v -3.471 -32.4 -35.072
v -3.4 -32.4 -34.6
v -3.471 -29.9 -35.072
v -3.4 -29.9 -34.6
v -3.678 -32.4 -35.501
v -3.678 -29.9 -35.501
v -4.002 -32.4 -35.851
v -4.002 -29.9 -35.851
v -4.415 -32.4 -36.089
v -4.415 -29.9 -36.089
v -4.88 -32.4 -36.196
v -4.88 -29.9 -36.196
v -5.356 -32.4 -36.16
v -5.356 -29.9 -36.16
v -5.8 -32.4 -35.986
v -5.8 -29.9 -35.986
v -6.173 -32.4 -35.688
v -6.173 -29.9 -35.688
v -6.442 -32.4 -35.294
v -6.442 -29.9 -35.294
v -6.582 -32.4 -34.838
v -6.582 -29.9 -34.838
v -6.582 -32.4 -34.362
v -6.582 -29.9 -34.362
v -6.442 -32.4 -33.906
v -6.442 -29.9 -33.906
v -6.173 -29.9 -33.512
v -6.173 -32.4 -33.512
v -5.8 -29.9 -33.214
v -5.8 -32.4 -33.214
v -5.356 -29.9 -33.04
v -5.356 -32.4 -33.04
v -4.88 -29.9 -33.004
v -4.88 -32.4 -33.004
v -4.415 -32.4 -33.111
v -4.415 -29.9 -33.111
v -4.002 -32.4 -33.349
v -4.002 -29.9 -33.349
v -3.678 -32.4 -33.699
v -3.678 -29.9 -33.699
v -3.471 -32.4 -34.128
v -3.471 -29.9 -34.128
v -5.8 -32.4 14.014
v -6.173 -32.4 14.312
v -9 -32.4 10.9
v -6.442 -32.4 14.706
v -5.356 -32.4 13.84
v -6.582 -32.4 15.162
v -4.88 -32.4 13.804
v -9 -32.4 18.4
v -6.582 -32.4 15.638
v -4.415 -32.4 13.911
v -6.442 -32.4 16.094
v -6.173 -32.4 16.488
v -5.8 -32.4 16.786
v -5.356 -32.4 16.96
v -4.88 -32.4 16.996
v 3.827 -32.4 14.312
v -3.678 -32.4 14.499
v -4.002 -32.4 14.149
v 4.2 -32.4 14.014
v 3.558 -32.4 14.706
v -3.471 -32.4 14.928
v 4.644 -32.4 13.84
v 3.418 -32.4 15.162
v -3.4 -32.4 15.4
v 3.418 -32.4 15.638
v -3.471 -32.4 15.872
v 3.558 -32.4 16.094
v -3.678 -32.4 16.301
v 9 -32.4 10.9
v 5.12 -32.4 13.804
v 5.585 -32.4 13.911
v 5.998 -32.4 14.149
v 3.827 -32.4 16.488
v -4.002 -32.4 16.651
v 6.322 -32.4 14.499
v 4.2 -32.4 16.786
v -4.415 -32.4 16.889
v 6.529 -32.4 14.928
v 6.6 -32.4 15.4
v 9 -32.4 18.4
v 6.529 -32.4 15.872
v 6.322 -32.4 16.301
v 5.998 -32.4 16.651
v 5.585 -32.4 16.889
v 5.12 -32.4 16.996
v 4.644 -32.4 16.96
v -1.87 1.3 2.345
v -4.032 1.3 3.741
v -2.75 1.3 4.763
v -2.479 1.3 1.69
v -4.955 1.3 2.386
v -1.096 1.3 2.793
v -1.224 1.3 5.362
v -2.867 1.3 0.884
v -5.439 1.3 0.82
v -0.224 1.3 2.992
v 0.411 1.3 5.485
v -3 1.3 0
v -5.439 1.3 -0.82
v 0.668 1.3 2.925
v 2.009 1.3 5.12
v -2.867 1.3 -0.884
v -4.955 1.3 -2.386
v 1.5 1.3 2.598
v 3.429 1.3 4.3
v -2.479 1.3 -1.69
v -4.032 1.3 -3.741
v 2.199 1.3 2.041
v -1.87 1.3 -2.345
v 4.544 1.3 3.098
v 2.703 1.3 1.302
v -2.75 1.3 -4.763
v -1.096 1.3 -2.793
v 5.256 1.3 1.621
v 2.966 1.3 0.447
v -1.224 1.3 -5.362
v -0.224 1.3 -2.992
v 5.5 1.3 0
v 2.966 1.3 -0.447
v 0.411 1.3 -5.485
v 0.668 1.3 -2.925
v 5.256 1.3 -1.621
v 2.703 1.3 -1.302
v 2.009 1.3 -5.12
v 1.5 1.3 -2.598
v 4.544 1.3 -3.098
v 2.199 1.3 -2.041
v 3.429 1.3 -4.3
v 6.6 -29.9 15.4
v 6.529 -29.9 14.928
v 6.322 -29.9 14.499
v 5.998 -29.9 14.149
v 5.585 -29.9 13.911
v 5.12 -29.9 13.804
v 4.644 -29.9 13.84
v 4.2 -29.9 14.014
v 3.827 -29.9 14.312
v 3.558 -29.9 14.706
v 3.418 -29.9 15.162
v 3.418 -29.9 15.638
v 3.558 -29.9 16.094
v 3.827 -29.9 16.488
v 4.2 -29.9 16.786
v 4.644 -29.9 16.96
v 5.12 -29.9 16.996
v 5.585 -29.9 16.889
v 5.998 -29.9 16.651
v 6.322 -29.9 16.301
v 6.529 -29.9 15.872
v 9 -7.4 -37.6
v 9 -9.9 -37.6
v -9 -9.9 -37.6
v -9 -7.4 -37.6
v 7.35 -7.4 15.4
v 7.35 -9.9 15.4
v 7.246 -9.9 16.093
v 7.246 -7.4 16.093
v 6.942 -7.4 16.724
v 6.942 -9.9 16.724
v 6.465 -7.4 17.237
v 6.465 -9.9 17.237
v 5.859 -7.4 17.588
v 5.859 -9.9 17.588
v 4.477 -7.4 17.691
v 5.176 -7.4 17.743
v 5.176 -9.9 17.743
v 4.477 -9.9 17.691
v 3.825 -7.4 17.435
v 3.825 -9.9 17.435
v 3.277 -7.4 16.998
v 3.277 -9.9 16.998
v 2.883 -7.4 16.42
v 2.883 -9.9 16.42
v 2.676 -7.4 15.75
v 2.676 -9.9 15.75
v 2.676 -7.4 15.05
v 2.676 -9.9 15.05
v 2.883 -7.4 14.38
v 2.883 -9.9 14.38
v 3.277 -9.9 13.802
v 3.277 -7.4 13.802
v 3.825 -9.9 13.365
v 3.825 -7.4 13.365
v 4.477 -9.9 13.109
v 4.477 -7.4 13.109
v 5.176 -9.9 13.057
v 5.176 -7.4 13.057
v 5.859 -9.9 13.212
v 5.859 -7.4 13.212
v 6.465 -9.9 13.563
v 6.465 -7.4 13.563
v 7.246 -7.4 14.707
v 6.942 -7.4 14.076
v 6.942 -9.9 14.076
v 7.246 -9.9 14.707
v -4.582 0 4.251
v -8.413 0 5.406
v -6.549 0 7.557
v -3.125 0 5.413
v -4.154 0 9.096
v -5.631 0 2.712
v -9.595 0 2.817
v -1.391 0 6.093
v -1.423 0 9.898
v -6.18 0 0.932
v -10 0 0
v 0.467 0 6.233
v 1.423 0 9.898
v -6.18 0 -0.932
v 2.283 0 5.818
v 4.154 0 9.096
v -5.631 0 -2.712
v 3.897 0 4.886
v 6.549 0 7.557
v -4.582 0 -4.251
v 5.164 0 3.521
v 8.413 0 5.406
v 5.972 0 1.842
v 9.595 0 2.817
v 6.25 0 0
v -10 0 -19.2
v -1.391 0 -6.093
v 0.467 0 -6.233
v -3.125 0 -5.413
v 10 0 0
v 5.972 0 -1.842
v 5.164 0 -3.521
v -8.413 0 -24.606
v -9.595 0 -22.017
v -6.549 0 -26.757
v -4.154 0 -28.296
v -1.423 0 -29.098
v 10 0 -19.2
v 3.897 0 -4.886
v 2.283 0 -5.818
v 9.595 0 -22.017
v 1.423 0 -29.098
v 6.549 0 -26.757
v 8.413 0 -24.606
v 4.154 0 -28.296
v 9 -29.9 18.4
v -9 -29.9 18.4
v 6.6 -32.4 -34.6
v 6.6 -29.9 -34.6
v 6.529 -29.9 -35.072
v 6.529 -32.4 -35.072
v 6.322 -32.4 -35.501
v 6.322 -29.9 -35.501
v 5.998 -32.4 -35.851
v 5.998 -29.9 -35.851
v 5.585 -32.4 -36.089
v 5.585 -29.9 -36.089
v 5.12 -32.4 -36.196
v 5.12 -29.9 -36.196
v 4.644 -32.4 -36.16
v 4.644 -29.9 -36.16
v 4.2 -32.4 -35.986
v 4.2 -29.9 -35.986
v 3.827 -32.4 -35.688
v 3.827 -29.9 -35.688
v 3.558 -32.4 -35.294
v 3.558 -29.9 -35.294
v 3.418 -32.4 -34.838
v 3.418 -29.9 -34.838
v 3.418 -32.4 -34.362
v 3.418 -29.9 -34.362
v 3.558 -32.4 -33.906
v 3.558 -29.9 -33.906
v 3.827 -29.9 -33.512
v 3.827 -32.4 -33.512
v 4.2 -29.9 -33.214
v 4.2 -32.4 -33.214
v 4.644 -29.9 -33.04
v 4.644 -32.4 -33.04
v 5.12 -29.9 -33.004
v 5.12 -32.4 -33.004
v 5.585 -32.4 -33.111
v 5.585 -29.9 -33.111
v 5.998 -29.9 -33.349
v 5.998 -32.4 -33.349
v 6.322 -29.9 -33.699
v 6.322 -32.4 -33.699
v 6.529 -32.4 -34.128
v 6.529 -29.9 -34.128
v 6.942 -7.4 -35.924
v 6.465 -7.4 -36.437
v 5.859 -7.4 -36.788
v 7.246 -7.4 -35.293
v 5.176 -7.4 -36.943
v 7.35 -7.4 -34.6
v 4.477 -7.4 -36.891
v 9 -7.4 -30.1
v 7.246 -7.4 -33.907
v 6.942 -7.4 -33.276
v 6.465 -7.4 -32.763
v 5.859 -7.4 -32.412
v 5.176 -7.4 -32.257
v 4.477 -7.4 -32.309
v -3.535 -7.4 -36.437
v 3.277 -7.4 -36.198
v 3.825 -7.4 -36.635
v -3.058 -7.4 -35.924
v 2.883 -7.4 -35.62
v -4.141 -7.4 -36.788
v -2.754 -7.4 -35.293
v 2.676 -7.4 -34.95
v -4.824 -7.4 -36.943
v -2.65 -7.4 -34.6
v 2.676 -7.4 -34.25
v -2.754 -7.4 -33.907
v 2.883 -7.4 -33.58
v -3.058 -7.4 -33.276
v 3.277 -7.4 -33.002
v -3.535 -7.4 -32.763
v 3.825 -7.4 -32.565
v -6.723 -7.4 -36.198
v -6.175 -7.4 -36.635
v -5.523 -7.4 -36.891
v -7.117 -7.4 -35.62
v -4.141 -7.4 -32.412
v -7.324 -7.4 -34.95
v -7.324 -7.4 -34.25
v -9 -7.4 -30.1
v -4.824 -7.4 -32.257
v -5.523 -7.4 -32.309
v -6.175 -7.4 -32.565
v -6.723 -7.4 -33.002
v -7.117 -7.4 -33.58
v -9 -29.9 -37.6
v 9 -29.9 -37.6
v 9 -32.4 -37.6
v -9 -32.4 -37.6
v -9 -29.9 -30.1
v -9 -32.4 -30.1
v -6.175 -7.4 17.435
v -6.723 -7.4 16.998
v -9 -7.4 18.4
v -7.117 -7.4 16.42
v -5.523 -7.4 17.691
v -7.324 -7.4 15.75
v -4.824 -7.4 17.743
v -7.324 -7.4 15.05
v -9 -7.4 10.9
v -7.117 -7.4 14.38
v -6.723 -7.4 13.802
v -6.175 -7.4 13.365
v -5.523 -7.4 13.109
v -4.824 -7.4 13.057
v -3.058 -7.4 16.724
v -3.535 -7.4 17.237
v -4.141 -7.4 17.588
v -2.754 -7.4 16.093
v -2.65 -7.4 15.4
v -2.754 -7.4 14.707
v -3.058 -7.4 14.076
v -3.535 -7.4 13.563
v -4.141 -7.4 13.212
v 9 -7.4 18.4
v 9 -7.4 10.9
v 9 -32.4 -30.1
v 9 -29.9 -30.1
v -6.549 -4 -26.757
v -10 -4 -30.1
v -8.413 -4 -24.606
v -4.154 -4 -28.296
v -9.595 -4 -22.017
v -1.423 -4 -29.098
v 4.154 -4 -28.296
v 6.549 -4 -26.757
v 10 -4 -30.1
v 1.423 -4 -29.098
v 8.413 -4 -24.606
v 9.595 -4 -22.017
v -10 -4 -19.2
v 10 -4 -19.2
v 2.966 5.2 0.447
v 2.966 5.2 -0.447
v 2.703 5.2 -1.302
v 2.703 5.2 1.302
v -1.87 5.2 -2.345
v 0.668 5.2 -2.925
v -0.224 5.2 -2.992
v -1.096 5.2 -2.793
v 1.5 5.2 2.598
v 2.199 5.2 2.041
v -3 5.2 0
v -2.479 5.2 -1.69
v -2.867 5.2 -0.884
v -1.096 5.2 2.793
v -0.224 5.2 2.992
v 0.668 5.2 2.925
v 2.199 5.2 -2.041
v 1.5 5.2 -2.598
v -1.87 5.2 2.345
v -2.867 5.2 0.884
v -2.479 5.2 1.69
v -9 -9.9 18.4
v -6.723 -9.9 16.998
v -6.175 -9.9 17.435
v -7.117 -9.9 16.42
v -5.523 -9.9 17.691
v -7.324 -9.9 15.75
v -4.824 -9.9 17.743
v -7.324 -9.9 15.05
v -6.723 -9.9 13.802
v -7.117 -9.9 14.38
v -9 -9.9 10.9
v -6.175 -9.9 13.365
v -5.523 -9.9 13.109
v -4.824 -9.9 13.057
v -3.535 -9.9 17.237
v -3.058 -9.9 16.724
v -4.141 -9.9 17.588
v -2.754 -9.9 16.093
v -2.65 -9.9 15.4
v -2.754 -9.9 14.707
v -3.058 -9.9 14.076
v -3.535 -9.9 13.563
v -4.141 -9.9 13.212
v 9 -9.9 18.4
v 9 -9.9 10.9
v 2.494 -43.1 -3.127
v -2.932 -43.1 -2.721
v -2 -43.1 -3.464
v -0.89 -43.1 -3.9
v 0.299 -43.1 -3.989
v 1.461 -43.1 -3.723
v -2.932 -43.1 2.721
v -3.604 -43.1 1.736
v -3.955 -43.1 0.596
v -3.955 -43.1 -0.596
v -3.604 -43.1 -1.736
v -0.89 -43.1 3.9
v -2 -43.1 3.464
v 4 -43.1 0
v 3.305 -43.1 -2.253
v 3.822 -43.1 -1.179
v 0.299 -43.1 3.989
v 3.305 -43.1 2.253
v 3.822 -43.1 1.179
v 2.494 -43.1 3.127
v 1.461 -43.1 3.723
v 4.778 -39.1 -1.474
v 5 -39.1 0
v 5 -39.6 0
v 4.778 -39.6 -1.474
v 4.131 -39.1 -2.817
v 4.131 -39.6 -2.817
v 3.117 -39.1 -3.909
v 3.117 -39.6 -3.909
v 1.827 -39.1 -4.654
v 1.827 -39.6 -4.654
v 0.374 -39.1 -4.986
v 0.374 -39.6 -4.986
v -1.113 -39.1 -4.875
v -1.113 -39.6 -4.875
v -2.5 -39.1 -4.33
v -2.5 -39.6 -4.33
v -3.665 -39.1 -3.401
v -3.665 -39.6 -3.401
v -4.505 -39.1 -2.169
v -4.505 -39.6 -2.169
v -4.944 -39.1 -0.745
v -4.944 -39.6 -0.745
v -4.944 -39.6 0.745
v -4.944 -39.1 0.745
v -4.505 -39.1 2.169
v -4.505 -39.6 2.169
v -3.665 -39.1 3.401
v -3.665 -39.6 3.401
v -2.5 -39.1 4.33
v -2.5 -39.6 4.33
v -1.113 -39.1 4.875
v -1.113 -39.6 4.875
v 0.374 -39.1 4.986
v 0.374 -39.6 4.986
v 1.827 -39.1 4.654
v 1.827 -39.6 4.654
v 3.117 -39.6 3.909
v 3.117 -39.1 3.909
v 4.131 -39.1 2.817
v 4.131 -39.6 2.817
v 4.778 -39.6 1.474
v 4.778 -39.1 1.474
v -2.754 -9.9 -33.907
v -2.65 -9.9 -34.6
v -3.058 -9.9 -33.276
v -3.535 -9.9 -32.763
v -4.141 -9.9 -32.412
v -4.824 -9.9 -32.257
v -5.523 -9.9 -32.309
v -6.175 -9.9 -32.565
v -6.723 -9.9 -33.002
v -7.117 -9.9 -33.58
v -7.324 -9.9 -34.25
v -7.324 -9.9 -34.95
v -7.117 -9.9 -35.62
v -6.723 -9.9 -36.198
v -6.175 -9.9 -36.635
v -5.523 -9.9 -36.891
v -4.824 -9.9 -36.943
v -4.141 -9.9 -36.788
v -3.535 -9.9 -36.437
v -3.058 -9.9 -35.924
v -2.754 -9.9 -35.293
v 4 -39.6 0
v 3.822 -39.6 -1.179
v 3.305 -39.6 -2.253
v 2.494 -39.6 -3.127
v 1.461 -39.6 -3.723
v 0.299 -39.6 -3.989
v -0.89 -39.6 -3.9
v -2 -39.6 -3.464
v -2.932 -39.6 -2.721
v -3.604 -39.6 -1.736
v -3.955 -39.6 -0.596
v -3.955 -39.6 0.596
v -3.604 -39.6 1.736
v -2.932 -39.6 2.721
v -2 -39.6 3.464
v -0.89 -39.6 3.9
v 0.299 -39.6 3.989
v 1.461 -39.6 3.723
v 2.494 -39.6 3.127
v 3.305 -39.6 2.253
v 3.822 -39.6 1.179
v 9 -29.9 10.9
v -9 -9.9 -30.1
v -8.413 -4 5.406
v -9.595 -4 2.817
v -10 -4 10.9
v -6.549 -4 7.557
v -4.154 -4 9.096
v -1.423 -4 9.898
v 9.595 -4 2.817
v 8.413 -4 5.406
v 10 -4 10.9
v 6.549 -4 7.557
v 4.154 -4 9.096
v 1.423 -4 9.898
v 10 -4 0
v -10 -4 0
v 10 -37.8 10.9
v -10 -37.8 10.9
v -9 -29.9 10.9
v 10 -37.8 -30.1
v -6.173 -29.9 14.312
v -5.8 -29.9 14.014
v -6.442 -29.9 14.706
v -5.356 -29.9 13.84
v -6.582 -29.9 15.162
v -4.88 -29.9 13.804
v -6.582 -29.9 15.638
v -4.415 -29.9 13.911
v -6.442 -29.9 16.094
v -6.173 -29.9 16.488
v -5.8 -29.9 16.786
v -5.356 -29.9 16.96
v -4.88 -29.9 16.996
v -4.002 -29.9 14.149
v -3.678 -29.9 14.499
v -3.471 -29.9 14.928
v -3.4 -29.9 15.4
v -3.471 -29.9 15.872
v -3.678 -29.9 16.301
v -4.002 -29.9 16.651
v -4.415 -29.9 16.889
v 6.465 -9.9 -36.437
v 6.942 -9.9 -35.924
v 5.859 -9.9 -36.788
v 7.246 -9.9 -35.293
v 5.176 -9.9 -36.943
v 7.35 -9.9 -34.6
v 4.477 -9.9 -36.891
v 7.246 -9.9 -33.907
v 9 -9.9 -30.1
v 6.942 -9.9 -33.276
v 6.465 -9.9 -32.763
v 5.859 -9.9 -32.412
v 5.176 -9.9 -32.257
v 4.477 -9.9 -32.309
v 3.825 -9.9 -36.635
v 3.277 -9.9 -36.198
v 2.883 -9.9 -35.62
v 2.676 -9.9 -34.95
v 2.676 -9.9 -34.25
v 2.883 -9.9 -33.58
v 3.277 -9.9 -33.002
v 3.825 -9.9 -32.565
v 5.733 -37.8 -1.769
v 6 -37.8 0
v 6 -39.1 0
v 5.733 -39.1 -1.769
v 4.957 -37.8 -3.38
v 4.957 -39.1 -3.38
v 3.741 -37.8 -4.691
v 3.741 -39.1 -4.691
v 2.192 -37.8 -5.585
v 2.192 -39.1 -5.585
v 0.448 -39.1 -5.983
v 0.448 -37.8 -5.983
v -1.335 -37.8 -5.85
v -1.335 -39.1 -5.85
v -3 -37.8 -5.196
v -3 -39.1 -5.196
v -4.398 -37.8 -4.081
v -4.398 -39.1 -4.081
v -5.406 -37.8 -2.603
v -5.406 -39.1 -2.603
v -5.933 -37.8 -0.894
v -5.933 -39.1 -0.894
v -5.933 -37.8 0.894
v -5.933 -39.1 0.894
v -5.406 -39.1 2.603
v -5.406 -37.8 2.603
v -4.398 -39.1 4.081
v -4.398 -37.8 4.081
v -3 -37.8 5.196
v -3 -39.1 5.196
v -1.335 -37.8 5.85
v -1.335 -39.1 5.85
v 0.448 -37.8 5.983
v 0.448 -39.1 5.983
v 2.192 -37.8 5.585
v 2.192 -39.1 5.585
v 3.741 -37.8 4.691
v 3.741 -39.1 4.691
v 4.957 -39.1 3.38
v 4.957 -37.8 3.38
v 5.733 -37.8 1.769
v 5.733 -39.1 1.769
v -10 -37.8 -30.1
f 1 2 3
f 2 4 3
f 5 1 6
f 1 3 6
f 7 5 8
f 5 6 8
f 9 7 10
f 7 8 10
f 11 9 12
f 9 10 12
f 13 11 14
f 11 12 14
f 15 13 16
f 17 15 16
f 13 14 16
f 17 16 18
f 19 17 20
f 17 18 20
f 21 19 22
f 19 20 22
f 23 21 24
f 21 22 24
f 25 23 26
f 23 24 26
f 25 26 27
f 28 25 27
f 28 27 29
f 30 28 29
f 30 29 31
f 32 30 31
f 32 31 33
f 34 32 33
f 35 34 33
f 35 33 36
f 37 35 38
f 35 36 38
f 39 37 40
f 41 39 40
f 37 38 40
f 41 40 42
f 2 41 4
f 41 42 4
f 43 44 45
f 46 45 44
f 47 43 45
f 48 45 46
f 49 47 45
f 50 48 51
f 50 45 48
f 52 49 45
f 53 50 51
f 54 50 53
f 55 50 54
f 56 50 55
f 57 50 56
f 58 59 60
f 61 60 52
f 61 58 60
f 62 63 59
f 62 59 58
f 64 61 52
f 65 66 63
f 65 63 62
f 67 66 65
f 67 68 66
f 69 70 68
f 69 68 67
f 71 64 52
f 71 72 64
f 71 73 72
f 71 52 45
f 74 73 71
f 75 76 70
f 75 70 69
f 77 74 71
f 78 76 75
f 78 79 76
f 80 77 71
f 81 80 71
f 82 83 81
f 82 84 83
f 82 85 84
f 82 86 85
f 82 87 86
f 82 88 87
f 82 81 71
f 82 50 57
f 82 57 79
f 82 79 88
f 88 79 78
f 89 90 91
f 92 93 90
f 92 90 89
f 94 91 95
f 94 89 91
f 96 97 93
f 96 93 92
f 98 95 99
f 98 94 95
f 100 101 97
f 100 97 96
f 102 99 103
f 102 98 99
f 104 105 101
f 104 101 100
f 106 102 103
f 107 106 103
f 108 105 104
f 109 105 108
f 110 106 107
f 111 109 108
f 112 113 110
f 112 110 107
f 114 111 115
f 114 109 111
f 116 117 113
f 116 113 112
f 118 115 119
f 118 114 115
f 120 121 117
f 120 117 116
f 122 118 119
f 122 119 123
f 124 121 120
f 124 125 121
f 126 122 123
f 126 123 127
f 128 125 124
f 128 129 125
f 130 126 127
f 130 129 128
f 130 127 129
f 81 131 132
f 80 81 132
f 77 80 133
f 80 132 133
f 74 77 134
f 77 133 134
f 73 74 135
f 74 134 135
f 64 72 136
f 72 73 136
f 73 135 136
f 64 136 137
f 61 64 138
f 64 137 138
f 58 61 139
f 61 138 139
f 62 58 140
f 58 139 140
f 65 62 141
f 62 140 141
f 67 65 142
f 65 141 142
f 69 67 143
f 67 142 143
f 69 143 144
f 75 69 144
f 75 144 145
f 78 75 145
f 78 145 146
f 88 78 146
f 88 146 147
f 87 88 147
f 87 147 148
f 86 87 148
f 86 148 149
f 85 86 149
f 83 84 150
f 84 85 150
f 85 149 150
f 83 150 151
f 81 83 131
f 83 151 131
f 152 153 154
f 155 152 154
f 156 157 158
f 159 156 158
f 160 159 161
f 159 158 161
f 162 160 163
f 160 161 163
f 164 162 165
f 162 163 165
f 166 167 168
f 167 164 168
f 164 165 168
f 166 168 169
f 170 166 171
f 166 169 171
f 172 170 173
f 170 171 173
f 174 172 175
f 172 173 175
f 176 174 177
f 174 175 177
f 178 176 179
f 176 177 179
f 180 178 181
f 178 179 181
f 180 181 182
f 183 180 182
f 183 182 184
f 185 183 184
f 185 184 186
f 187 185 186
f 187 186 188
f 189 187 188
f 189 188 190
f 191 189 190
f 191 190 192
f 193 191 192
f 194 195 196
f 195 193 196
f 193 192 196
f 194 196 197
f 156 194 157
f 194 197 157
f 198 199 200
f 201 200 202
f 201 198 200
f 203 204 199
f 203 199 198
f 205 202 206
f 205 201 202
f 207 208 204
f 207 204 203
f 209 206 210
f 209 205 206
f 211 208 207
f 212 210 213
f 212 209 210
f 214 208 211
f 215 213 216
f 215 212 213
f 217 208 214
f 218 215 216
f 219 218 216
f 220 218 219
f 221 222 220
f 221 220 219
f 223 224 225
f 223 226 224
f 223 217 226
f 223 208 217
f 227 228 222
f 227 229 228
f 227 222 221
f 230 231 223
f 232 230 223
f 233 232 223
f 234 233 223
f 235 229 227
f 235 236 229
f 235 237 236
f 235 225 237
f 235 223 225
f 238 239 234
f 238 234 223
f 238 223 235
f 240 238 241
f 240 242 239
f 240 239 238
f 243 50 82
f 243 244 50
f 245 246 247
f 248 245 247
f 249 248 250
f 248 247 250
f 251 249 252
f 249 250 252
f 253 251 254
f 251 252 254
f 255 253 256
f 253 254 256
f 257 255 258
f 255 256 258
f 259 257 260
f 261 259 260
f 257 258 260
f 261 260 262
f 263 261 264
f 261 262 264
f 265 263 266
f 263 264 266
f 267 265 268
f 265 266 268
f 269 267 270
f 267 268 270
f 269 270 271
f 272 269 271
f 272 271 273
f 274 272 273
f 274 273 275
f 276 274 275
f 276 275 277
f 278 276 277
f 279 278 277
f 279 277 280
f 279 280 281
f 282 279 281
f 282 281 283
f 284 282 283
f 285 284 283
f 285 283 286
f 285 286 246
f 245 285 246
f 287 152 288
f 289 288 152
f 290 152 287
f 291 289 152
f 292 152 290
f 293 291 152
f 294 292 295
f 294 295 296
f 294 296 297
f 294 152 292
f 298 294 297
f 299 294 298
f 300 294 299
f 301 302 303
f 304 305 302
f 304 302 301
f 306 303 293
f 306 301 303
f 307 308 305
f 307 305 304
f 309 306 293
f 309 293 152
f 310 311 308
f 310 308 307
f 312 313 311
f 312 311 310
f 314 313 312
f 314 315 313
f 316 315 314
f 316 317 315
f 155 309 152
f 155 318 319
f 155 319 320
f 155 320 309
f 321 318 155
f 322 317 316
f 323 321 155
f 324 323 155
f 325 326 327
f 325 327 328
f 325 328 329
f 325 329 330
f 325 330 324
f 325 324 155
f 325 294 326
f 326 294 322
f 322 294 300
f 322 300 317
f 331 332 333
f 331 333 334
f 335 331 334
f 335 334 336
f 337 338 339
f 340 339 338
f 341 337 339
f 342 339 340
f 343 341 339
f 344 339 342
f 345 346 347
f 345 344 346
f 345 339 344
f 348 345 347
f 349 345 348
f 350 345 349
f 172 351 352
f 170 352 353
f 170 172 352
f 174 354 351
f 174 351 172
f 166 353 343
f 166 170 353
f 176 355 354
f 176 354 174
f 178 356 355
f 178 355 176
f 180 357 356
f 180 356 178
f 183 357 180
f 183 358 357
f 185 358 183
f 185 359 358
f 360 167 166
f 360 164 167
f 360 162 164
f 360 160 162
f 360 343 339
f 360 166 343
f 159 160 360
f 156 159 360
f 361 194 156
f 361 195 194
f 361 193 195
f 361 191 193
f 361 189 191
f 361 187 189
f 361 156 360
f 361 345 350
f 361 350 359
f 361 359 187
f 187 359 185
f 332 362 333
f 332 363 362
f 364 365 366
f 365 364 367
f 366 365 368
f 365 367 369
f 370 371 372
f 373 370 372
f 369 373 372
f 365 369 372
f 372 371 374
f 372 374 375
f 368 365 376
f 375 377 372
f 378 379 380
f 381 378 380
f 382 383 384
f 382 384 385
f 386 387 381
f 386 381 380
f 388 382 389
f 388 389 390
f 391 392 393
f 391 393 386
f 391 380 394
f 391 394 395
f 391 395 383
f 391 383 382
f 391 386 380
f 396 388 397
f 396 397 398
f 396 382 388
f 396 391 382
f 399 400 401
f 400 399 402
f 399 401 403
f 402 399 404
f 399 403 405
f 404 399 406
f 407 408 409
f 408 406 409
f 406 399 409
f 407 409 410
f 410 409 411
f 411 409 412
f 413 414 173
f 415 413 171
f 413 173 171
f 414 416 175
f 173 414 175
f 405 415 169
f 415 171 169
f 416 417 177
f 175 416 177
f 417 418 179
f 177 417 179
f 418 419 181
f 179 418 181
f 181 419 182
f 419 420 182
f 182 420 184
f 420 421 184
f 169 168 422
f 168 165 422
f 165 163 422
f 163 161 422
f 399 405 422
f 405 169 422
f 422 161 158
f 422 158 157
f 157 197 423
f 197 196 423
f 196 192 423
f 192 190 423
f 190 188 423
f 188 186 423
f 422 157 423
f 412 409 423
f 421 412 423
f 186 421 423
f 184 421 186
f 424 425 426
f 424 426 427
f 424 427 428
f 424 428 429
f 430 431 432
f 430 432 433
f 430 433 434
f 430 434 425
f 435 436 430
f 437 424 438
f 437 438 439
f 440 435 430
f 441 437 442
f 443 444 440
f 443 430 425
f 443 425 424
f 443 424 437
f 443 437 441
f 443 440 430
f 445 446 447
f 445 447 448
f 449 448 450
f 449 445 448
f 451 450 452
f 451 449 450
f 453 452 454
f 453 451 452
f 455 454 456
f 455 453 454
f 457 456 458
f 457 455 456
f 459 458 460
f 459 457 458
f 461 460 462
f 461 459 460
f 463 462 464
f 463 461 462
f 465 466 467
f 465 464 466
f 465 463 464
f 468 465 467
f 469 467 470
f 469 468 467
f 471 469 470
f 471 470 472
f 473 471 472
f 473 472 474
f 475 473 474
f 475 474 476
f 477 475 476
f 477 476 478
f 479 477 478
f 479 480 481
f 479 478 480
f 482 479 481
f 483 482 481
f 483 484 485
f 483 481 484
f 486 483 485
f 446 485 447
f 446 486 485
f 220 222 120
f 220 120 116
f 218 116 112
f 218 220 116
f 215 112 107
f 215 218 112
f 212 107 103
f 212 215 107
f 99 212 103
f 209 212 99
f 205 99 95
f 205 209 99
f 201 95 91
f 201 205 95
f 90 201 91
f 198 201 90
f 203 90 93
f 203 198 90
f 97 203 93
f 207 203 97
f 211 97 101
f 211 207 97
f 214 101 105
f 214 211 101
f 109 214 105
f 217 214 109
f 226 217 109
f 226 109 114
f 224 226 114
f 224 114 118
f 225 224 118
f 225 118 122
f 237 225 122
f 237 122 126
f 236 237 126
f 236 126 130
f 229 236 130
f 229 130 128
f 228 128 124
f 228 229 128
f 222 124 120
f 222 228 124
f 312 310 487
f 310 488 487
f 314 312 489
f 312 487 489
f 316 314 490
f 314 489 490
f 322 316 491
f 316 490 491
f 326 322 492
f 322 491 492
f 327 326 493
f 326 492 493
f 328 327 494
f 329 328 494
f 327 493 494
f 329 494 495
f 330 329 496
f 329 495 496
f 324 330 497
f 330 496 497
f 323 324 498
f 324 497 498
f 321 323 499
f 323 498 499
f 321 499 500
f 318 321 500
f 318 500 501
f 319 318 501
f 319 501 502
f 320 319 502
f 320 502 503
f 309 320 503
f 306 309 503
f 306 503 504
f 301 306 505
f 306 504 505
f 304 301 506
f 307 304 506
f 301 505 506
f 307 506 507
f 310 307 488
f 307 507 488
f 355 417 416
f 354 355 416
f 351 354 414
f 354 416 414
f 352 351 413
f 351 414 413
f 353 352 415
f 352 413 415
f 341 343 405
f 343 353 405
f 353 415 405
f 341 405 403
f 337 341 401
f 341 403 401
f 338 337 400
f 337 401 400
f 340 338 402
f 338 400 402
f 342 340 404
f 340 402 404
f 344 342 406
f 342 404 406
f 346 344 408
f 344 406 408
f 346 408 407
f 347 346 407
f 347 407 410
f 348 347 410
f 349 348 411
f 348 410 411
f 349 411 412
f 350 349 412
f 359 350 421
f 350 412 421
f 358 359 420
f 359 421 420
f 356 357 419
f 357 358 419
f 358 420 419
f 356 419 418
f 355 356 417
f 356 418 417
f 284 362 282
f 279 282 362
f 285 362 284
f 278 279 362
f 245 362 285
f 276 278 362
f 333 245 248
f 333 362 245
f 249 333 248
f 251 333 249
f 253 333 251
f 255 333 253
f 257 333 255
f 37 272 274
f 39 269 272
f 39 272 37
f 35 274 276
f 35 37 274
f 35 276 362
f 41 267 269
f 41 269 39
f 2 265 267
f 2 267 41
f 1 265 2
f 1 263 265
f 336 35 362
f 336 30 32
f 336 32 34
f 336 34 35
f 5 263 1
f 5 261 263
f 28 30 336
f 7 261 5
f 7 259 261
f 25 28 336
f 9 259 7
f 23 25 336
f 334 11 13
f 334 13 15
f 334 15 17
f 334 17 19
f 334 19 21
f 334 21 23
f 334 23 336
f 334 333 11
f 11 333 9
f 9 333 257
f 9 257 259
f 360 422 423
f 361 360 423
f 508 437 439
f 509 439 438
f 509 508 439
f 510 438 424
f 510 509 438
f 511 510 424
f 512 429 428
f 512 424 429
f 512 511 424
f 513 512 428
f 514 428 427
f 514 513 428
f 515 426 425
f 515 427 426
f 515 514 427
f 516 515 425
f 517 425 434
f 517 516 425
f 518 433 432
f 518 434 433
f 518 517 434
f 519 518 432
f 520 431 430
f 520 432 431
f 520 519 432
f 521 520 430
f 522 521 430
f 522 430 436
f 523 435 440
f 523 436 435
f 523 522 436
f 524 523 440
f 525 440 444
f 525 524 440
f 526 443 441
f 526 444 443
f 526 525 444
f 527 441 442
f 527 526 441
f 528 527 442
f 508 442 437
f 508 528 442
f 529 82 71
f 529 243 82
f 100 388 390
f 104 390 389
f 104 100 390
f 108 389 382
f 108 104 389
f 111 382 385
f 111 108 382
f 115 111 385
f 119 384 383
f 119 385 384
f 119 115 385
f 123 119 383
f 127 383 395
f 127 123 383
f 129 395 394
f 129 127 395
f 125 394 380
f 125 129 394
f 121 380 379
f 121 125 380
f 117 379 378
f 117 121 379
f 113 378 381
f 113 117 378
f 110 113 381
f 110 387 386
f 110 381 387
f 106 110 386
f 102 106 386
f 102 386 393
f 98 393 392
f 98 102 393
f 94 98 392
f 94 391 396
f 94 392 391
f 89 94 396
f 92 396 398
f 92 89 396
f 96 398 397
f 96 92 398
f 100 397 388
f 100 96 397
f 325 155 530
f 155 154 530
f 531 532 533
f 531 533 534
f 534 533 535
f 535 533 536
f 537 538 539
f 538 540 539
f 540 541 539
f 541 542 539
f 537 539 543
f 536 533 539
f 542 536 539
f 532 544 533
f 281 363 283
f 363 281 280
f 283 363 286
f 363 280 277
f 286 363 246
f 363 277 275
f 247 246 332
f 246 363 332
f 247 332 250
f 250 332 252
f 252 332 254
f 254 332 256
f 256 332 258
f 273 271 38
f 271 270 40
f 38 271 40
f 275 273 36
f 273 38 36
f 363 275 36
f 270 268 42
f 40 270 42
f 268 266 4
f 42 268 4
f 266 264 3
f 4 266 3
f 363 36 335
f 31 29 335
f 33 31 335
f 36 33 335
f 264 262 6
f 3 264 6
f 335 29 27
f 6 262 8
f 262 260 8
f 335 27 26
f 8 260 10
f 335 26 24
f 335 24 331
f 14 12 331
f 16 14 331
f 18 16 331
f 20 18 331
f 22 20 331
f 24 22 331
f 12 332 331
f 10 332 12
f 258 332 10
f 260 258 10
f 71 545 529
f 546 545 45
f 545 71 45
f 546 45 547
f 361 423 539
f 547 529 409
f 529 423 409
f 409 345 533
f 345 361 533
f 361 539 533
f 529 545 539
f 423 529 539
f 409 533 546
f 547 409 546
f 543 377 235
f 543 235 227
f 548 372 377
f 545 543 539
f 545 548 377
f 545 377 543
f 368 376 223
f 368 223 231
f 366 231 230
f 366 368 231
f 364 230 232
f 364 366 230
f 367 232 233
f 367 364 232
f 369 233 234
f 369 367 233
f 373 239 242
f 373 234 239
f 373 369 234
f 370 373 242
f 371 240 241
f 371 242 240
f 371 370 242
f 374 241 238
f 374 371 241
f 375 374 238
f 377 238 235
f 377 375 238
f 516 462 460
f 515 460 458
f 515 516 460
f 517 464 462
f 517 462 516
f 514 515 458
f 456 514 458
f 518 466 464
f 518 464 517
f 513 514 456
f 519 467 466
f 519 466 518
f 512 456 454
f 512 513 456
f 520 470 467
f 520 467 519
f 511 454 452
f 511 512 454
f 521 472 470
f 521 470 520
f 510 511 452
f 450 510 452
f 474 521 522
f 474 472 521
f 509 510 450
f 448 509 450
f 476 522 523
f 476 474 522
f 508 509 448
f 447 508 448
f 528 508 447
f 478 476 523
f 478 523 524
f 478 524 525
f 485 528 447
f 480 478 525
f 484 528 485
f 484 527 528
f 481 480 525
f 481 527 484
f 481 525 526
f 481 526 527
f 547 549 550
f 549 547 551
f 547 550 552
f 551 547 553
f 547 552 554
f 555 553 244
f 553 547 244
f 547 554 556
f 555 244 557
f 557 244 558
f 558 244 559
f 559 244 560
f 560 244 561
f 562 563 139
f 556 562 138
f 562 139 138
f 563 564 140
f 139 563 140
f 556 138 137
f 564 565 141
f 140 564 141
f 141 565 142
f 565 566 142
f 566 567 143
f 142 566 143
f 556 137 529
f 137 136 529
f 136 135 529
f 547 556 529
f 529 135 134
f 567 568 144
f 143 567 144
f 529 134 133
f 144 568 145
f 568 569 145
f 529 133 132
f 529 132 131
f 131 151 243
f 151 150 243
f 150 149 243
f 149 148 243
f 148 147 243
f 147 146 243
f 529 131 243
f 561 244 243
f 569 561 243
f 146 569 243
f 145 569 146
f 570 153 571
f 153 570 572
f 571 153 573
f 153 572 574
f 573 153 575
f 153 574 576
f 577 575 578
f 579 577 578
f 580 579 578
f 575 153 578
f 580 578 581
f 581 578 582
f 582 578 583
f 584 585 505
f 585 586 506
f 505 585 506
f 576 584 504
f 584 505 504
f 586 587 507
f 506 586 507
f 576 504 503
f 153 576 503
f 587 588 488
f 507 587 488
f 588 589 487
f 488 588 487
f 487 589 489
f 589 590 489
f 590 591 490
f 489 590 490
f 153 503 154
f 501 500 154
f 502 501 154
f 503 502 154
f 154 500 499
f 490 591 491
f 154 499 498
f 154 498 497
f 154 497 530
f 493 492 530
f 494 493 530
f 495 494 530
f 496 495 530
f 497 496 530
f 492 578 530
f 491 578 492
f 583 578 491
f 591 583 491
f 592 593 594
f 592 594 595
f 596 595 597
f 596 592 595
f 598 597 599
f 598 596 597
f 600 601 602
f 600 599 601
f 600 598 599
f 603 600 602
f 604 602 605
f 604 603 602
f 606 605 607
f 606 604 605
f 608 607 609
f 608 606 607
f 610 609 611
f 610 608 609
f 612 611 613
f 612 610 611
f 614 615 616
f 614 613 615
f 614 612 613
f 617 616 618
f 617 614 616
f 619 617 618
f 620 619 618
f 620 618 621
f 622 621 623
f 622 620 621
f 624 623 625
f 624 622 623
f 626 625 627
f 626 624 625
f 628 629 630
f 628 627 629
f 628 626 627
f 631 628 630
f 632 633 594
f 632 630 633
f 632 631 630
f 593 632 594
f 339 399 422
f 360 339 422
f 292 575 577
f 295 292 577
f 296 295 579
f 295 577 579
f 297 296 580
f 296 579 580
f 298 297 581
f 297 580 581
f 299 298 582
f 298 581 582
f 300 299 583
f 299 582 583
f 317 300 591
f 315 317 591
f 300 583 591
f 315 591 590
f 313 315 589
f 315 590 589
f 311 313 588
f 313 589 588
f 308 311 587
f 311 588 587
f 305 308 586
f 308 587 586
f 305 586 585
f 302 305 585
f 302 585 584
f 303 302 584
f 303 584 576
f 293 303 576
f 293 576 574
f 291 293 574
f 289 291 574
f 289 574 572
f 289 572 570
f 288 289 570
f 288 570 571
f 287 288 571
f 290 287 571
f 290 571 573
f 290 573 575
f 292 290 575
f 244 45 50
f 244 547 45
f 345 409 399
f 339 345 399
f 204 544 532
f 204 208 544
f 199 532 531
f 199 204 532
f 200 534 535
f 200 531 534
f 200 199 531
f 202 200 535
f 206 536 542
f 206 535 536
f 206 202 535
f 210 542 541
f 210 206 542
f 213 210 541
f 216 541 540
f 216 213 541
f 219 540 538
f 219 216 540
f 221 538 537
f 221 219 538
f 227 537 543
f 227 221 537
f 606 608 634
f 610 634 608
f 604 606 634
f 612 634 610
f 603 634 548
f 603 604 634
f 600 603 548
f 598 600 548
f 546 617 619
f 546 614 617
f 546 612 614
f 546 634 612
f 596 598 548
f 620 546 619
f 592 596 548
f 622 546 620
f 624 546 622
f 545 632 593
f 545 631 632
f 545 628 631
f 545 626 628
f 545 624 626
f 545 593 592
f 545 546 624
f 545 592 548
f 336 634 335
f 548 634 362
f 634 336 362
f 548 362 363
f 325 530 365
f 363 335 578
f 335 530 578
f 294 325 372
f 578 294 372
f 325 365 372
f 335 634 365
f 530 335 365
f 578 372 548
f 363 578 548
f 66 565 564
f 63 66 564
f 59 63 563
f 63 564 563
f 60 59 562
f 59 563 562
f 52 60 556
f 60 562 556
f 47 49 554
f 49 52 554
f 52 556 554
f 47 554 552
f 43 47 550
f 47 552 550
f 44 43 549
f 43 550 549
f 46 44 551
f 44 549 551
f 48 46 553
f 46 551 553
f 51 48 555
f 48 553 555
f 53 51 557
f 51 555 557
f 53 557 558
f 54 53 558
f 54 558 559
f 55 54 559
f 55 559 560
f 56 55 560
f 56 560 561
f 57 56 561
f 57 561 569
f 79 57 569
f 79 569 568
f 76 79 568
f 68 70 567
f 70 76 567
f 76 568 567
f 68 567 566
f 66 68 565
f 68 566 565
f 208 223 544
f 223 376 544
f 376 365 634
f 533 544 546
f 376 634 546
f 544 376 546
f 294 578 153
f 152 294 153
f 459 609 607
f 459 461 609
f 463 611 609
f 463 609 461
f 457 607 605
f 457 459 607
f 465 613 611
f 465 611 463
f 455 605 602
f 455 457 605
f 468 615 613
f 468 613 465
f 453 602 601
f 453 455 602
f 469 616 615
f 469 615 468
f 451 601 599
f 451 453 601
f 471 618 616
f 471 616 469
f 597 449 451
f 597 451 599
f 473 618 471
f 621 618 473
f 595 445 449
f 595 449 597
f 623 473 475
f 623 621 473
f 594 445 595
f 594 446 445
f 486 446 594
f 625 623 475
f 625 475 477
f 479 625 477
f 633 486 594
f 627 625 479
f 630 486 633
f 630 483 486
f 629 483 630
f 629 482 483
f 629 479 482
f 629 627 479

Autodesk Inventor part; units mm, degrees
sketch "スケッチ1" plane through (0, 0, 0) normal (0, 1, 0) x (-1, 0, 0)
  circle A0 centre (0, 0) radius 3
  dimension "d0" = 6
extrude "押し出し1" add sketch "スケッチ1" along normal blind 5.2
sketch "スケッチ2" plane through (0, 0, 0) normal (0, -1, 0) x (1, 0, 0)
  circle A0 centre (0, 0) radius 10
  dimension "d3" = 20
extrude "押し出し2" add sketch "スケッチ2" along normal blind 4
sketch "スケッチ3" plane through (0, -4, 0) normal (0, -1, 0) x (1, 0, 0)
  line L0 (0, 0) -> (0, -9.6) construction
  line L1 (10, 10.9) -> (-10, 10.9)
  line L2 (-10, 10.9) -> (-10, -30.1)
  line L3 (-10, -30.1) -> (10, -30.1)
  line L4 (10, -30.1) -> (10, 10.9)
  line L5 (10, 10.9) -> (-10, -30.1) construction
  line L6 (-10, 10.9) -> (10, -30.1) construction
  dimension "d6" = 9.6
  dimension "d7" = 20
  dimension "d8" = 41
extrude "押し出し3" add sketch "スケッチ3" along normal blind 33.8
sketch "スケッチ4" plane through (0, -4, 0) normal (0, 1, 0) x (1, 0, 0)
  circle A0 centre (0, 0) radius 3 construction
  line L0 (0, 0) -> (0, 19.2) construction
  arc A1 (10, 19.2) -> (-10, 19.2) centre (0, 19.2) ccw
  line L1 (-10, 19.2) -> (-10, 0)
  circle A2 centre (0, 0) radius 10 construction
  line L2 (10, 19.2) -> (10, 0)
  line L3 (10, 30.1) -> (10, -10.9) projected
  arc A3 (10, 0) -> (-10, 0) centre (0, 0) ccw
  dimension "d11" = 19.2
  dimension "d12" = 10
extrude "押し出し4" add sketch "スケッチ4" along normal blind 4
ref_plane "作業平面1" through (0, 1.3, 0) normal (0, 1, 0) x (1, 0, 0)
sketch "スケッチ5" plane through (0, 0, 0) normal (0, 1, 0) x (1, 0, 0)
  circle A0 centre (0, 0) radius 6.25
  dimension "d16" = 12.5
sketch "スケッチ6" plane through (0, 1.3, 0) normal (0, 1, 0) x (1, 0, 0)
  circle A0 centre (0, 0) radius 5.5
  dimension "d17" = 11
loft "ロフト1" add profiles "スケッチ5", "スケッチ6"
ref_plane "作業平面2" through (0, -9.9, 0) normal (0, 1, 0) x (1, 0, 0)
ref_plane "作業平面3" through (0, -29.9, 0) normal (0, -1, 0) x (1, 0, 0)
sketch "スケッチ7" plane through (0, -9.9, 0) normal (0, 1, 0) x (1, 0, 0)
  line L0 (10, -10.9) -> (-10, -10.9) projected
  line L1 (9, -10.9) -> (-9, -10.9)
  line L2 (-9, -10.9) -> (-9, -18.4)
  line L3 (-9, -18.4) -> (9, -18.4)
  line L4 (9, -18.4) -> (9, -10.9)
  line L5 (10, 30.1) -> (10, -10.9) projected
  line L6 (9, -15.4) -> (-9, -15.4) construction
  circle A0 centre (5, -15.4) radius 2.35
  circle A1 centre (-5, -15.4) radius 2.35
  point P0 (0, 0)
  dimension "d24" = 18
  dimension "d25" = 7.5
  dimension "d26" = 1
  dimension "d27" = 3
  dimension "d28" = 4.7
  dimension "d29" = 4
  dimension "d30" = 4.7
  dimension "d31" = 4
extrude "押し出し5" add sketch "スケッチ7" along normal blind 2.5
ref_plane "作業平面4" through (10, -4, -9.6) normal (0, 0, -1) x (-1, 0, 0)
mirror "ミラー1" about plane through (10, -4, -9.6) normal (0, 0, -1) of "押し出し5"
sketch "スケッチ8" plane through (0, -29.9, 0) normal (0, -1, 0) x (1, 0, 0)
  line L0 (10, 10.9) -> (-10, 10.9) projected
  line L1 (9, 10.9) -> (-9, 10.9)
  line L2 (-9, 10.9) -> (-9, 18.4)
  line L3 (-9, 18.4) -> (9, 18.4)
  line L4 (9, 18.4) -> (9, 10.9)
  line L5 (10, -30.1) -> (10, 10.9) projected
  line L6 (9, 18.4) -> (9, 10.9) projected
  line L7 (9, 15.4) -> (-9, 15.4) construction
  line L8 (-9, 10.9) -> (-9, 18.4) projected
  circle A0 centre (5, 15.4) radius 1.6
  circle A1 centre (-5, 15.4) radius 1.6
  point P0 (0, 0)
  dimension "d35" = 18
  dimension "d36" = 7.5
  dimension "d37" = 1
  dimension "d38" = 3
  dimension "d39" = 3.2
  dimension "d40" = 4
  dimension "d41" = 3.2
  dimension "d42" = 4
extrude "押し出し6" add sketch "スケッチ8" along normal blind 2.5
mirror "ミラー2" about plane through (10, -4, -9.6) normal (0, 0, -1) of "押し出し6"
sketch "スケッチ9" plane through (0, -37.8, 0) normal (0, -1, 0) x (1, 0, 0)
  circle A0 centre (0, 0) radius 4
  dimension "d45" = 8
extrude "押し出し7" add sketch "スケッチ9" along normal blind 5.3
sketch "スケッチ10" plane through (0, -37.8, 0) normal (0, -1, 0) x (1, 0, 0)
  circle A0 centre (0, 0) radius 6
  dimension "d48" = 12
extrude "押し出し8" add sketch "スケッチ10" along normal blind 1.3
sketch "スケッチ11" plane through (0, -39.1, 0) normal (0, -1, 0) x (1, 0, 0)
  circle A0 centre (0, 0) radius 5
  dimension "d51" = 10
extrude "押し出し9" add sketch "スケッチ11" along normal blind 0.5
properties part number "krs2350_hv_sa"
